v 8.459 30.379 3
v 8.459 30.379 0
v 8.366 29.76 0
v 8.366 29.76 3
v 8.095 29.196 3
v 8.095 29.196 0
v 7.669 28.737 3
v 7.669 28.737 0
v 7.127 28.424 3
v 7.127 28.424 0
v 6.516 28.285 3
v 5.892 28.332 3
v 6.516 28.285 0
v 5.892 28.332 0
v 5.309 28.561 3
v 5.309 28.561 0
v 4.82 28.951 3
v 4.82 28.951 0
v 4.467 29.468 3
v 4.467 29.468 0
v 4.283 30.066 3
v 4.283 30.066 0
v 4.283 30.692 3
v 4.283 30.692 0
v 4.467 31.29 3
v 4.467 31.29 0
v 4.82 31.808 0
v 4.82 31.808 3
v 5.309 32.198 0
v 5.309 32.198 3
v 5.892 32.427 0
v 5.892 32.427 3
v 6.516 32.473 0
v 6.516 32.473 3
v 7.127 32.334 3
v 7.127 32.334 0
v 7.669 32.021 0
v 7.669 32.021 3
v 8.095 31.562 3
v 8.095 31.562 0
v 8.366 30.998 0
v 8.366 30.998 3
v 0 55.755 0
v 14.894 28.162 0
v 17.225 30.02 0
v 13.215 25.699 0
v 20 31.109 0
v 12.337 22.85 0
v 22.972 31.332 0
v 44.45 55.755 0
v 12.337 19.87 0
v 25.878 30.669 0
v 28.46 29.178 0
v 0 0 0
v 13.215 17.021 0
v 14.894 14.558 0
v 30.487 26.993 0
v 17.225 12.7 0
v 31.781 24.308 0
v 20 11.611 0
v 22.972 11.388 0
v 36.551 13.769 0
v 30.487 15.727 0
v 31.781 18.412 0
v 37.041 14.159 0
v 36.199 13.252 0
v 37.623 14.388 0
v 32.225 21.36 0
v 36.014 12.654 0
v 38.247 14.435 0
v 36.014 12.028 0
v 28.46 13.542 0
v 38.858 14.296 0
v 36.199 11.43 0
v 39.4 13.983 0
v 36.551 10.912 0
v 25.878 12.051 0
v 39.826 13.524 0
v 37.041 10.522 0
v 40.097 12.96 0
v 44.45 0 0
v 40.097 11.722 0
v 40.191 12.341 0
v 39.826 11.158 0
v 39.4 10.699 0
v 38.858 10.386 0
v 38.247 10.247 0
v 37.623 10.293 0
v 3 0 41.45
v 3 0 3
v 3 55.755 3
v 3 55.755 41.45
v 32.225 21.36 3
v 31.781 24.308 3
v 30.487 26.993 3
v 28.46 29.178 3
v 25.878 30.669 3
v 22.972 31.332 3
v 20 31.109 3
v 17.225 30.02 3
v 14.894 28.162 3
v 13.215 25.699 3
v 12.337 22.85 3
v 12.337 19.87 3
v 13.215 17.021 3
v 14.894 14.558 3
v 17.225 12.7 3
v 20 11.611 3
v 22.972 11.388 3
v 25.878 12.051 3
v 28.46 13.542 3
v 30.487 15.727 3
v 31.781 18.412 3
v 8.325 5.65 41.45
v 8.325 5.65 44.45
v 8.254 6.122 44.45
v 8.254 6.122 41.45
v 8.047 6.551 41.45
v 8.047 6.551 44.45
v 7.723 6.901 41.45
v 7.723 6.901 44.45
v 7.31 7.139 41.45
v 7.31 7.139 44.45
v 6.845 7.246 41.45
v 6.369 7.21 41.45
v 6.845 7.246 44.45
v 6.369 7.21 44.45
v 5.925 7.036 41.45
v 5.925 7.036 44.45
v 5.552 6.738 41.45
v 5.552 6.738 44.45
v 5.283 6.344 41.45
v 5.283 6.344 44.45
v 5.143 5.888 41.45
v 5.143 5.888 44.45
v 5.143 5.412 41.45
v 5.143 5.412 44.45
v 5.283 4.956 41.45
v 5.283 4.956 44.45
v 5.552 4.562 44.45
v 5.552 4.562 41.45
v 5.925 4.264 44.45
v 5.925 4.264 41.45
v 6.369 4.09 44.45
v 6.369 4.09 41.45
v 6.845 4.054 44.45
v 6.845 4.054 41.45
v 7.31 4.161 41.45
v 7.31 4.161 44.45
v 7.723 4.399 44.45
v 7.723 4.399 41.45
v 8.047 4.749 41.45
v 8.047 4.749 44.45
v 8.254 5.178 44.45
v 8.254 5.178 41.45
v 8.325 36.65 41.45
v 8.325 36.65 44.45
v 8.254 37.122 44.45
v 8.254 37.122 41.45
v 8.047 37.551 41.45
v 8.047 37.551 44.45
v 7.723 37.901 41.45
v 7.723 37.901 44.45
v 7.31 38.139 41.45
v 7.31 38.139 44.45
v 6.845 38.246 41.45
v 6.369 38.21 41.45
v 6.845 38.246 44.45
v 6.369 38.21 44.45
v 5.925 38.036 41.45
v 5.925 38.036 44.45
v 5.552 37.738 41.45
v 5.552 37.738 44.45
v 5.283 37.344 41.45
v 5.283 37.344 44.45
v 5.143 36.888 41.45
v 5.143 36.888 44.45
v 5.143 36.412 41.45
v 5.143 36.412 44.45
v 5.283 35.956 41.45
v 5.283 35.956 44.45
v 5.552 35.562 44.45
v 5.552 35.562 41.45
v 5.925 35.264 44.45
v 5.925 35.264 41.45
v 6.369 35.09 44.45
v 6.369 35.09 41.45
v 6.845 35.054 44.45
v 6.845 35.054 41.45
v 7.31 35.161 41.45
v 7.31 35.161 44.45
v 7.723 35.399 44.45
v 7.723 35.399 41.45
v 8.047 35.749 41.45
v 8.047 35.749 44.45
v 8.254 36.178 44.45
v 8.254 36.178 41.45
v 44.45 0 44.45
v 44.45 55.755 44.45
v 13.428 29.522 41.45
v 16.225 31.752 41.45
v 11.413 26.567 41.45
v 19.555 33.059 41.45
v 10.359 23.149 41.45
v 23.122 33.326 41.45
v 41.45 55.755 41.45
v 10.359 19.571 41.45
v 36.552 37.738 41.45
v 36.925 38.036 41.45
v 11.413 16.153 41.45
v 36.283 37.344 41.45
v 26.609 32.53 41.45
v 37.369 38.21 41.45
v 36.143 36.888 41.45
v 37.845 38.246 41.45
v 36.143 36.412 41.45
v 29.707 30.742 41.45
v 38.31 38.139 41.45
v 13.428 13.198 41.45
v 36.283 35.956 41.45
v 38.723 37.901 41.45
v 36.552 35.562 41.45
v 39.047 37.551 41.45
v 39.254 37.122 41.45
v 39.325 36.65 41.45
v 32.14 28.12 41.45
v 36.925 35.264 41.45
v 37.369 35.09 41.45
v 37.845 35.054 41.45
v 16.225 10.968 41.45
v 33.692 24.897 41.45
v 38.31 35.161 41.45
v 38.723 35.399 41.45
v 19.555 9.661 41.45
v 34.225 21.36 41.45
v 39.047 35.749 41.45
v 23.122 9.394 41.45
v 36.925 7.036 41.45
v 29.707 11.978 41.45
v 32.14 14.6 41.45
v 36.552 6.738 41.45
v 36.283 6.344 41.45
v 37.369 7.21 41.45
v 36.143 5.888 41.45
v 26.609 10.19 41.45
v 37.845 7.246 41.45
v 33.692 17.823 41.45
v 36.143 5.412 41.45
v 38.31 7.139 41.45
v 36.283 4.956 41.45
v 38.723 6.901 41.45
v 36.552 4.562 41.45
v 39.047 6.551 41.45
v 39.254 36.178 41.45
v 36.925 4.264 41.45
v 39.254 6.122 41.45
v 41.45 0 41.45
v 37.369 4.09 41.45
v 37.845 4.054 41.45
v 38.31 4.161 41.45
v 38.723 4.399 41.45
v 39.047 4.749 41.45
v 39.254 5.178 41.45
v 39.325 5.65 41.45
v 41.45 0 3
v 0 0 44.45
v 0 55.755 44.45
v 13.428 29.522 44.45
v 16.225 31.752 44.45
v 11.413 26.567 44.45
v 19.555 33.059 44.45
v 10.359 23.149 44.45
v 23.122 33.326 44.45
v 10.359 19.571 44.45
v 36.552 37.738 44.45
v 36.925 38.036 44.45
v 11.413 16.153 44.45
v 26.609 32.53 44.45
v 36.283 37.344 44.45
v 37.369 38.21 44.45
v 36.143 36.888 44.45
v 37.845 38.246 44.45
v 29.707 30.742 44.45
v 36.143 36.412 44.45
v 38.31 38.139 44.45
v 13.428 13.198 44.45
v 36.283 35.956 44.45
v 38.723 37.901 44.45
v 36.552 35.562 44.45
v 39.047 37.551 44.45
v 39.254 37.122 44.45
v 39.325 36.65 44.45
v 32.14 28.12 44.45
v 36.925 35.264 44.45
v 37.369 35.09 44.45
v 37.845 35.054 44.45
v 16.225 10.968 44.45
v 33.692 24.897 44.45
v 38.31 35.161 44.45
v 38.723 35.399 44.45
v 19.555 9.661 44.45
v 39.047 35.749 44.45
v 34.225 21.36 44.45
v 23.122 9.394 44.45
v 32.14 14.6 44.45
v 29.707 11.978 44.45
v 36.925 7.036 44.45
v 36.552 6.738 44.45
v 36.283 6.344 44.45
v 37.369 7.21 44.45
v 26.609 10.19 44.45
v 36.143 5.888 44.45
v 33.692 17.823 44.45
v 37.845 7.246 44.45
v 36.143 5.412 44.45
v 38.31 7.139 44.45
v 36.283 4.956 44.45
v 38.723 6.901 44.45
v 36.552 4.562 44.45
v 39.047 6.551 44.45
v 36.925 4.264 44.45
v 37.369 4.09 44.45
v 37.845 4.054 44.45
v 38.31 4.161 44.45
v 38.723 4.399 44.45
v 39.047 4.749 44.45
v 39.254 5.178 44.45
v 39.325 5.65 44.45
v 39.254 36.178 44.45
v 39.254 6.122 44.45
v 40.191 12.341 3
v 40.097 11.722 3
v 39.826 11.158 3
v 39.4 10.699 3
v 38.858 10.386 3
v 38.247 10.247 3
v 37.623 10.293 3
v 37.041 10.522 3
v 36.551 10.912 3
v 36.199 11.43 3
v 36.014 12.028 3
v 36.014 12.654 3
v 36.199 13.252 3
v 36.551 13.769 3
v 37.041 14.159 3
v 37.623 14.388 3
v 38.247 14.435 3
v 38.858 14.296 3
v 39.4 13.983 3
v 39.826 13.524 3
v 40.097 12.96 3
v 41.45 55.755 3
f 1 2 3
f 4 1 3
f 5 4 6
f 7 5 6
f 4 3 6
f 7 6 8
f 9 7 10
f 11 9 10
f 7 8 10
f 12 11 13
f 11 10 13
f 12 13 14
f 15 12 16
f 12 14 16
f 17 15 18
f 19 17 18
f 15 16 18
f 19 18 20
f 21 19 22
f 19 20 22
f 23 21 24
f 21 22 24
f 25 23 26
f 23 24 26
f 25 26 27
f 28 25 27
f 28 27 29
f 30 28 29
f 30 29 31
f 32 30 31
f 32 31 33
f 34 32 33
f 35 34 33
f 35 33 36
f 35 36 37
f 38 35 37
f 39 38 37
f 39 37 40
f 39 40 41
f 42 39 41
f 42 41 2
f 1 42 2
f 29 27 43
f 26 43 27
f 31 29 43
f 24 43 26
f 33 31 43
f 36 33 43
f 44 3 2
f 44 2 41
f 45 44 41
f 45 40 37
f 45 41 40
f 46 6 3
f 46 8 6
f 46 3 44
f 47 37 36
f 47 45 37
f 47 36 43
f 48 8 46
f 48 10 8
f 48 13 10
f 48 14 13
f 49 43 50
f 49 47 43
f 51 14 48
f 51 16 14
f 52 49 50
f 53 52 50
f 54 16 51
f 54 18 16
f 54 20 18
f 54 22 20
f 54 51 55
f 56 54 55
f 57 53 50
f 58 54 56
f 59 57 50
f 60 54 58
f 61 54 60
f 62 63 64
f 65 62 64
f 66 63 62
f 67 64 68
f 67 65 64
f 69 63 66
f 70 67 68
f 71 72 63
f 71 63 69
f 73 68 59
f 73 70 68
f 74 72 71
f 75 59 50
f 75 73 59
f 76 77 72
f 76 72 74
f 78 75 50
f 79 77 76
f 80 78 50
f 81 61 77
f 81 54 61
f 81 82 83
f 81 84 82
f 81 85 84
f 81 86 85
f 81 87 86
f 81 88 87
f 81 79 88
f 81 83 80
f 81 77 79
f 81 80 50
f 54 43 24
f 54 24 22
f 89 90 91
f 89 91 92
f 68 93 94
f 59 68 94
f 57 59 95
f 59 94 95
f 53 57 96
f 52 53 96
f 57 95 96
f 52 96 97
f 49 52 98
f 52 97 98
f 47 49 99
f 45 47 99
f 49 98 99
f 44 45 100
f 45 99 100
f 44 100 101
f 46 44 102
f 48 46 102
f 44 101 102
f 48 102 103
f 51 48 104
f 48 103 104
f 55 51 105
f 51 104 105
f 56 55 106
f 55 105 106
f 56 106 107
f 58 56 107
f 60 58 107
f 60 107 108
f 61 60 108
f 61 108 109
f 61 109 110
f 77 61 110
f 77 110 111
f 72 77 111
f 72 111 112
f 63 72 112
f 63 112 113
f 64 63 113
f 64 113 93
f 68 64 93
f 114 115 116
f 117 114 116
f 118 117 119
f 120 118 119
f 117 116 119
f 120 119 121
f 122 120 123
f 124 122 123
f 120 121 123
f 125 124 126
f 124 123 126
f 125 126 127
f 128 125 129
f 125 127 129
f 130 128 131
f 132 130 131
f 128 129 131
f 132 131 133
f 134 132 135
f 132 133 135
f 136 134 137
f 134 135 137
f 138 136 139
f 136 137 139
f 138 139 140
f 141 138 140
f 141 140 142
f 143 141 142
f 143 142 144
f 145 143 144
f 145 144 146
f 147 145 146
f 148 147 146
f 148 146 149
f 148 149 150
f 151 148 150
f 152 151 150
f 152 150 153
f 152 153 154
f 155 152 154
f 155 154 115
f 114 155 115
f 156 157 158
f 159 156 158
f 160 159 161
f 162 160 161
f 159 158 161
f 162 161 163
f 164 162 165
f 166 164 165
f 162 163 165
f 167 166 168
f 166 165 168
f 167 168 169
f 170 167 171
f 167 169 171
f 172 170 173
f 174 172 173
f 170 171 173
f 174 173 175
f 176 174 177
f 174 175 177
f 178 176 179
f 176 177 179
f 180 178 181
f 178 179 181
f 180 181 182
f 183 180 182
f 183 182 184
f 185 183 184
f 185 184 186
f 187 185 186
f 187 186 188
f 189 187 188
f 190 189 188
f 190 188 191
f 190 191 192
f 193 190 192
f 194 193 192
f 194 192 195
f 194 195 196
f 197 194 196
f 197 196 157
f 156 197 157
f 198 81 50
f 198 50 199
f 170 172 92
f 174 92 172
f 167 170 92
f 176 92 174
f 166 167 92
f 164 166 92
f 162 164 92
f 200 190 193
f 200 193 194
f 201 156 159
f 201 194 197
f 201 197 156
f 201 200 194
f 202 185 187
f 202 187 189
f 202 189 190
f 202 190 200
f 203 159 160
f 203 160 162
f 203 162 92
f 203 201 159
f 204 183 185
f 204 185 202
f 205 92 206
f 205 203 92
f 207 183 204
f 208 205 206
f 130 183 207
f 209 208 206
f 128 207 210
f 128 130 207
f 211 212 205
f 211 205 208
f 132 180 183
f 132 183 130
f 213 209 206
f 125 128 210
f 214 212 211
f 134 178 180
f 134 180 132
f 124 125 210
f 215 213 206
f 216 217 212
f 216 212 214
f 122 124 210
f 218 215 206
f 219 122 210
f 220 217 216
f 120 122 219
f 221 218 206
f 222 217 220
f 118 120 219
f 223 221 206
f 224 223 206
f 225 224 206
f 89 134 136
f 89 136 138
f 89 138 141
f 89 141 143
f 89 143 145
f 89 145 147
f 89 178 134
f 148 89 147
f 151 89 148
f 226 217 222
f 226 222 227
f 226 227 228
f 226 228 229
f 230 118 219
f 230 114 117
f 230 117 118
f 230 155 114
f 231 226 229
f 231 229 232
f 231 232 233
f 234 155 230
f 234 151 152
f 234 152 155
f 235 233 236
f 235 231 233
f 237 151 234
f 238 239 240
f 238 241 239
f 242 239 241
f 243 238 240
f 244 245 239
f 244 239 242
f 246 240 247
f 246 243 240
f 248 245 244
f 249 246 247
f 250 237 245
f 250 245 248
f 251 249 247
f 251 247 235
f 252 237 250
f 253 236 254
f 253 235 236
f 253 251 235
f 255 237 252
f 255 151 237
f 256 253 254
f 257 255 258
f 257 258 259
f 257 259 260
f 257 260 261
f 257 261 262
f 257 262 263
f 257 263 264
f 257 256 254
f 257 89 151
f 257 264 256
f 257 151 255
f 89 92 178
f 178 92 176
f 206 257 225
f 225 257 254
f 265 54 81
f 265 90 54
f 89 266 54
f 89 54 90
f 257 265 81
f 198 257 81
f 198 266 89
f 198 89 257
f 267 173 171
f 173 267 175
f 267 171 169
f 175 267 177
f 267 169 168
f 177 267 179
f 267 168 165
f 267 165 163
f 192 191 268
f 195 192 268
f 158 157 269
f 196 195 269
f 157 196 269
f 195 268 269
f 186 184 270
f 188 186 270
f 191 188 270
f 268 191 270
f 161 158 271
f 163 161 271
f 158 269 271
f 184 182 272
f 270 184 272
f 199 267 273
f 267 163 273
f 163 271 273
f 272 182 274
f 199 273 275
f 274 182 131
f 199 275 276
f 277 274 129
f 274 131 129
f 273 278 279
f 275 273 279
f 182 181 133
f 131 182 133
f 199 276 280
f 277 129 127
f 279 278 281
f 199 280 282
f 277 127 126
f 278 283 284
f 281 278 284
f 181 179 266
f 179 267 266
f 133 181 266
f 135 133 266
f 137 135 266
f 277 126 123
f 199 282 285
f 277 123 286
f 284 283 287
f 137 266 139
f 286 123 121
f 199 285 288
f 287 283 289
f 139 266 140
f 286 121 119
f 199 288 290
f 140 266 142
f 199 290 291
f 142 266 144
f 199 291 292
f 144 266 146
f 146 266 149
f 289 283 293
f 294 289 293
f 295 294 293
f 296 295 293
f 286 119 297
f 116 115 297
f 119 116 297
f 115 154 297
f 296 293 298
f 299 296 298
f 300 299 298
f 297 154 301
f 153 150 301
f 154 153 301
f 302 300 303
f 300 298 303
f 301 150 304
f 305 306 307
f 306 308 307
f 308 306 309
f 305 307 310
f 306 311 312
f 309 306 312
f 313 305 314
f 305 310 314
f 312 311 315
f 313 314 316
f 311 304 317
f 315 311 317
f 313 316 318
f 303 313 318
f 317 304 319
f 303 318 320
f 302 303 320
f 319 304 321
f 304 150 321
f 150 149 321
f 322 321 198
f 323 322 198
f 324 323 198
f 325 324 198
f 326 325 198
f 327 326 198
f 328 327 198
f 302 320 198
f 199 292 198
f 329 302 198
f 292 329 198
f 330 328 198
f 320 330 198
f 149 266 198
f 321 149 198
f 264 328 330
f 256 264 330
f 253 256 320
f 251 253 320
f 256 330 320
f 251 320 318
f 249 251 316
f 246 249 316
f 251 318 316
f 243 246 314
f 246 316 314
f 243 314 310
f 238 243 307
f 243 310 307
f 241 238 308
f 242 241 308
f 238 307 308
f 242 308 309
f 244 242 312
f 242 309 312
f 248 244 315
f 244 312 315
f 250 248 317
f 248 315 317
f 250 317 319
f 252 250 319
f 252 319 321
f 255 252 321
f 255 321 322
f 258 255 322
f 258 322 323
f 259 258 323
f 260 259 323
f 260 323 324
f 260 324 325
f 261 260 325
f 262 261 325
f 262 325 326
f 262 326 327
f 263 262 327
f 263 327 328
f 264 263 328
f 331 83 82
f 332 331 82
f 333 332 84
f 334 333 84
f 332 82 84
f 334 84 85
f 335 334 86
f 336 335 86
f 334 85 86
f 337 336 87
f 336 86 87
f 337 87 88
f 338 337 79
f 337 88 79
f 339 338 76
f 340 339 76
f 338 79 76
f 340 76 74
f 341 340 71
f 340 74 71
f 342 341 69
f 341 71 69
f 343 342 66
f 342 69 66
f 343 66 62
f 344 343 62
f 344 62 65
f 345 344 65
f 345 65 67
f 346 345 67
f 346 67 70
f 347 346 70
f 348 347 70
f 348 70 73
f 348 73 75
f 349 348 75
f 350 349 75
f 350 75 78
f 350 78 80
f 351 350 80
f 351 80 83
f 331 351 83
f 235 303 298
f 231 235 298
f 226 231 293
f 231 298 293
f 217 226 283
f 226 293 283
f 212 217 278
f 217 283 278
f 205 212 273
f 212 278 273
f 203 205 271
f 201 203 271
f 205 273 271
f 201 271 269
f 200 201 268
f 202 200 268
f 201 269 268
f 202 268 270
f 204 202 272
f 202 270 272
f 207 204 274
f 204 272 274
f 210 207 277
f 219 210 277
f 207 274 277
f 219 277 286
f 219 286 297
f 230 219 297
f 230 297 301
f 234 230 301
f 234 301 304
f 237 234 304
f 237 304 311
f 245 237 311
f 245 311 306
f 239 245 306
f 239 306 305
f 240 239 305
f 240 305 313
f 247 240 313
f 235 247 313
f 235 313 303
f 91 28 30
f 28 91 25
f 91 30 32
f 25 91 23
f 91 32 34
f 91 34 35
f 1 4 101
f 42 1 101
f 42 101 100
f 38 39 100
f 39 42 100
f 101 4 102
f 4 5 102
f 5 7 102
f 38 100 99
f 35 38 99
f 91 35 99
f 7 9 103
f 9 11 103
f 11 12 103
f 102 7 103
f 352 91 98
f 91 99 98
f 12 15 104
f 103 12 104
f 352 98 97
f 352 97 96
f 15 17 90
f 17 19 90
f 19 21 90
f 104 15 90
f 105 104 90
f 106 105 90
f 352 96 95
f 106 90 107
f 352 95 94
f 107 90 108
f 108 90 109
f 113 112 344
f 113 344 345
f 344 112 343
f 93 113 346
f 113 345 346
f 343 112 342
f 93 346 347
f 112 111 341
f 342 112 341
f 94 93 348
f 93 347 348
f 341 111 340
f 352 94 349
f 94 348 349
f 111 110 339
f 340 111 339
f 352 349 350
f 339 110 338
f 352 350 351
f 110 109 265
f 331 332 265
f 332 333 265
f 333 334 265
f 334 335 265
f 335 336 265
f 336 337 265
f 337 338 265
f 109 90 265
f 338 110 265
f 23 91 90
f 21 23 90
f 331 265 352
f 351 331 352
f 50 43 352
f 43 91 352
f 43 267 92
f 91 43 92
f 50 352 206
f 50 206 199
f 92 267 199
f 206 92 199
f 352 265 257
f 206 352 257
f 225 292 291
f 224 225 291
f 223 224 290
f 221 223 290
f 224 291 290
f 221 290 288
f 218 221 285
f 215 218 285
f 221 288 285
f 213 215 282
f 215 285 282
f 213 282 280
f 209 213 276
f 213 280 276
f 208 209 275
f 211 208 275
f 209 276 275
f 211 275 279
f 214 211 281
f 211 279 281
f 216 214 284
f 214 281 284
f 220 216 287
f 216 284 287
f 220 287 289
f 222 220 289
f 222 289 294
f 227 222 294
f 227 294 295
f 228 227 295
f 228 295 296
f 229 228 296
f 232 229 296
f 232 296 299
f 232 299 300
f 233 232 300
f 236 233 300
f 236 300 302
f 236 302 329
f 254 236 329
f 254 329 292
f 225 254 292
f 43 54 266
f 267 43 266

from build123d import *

# Parameters (mm, degrees)
F0_W     = 44.45
F0_H     = 44.45
F0_W_2   = 38.45
F0_H_2   = 38.45
F1_DEPTH = 55.755
F2_R     = 10
F3_DEPTH = 44.451
F4_R     = 1.6
F4_R_2   = 12
F5_DEPTH = 5
F6_R     = 2.1
F7_DEPTH = 5


with BuildPart() as f1:
    # F0 (on Front) → F1 (new body)
    with BuildSketch(Plane.XZ):
        with Locations((22.225, 22.225)):
            Rectangle(F0_W, F0_H)
        with Locations((22.225, 22.225)):
            Rectangle(F0_W_2, F0_H_2, mode=Mode.SUBTRACT)
    extrude(amount=-F1_DEPTH)

    # F2 (on face) → F3 (cut, through all)
    with BuildSketch(Plane.XY.offset(44.45)):
        with Locations((22.225, 21.36)):
            Circle(F2_R)
    extrude(amount=-F3_DEPTH, mode=Mode.SUBTRACT)

    # F4 (on face) → F5 (cut)
    with BuildSketch(Plane.XY.offset(44.45)):
        with Locations((37.725, 5.65)):
            Circle(F4_R)
        with Locations((6.725, 5.65)):
            Circle(F4_R)
        with Locations((37.725, 36.65)):
            Circle(F4_R)
        with Locations((6.725, 36.65)):
            Circle(F4_R)
        with Locations((22.225, 21.36)):
            Circle(F4_R_2)
    extrude(amount=-F5_DEPTH, mode=Mode.SUBTRACT)

    # F6 (on face) → F7 (cut)
    with BuildSketch(Plane(origin=(0, 0, 0), x_dir=(1, 0, 0), z_dir=(0, 0, -1))):
        with Locations((38.090564, -12.340778)):
            Circle(F6_R)
        with Locations((6.359436, -30.379222)):
            Circle(F6_R)
    extrude(amount=-F7_DEPTH, mode=Mode.SUBTRACT)


solid = f1.part
